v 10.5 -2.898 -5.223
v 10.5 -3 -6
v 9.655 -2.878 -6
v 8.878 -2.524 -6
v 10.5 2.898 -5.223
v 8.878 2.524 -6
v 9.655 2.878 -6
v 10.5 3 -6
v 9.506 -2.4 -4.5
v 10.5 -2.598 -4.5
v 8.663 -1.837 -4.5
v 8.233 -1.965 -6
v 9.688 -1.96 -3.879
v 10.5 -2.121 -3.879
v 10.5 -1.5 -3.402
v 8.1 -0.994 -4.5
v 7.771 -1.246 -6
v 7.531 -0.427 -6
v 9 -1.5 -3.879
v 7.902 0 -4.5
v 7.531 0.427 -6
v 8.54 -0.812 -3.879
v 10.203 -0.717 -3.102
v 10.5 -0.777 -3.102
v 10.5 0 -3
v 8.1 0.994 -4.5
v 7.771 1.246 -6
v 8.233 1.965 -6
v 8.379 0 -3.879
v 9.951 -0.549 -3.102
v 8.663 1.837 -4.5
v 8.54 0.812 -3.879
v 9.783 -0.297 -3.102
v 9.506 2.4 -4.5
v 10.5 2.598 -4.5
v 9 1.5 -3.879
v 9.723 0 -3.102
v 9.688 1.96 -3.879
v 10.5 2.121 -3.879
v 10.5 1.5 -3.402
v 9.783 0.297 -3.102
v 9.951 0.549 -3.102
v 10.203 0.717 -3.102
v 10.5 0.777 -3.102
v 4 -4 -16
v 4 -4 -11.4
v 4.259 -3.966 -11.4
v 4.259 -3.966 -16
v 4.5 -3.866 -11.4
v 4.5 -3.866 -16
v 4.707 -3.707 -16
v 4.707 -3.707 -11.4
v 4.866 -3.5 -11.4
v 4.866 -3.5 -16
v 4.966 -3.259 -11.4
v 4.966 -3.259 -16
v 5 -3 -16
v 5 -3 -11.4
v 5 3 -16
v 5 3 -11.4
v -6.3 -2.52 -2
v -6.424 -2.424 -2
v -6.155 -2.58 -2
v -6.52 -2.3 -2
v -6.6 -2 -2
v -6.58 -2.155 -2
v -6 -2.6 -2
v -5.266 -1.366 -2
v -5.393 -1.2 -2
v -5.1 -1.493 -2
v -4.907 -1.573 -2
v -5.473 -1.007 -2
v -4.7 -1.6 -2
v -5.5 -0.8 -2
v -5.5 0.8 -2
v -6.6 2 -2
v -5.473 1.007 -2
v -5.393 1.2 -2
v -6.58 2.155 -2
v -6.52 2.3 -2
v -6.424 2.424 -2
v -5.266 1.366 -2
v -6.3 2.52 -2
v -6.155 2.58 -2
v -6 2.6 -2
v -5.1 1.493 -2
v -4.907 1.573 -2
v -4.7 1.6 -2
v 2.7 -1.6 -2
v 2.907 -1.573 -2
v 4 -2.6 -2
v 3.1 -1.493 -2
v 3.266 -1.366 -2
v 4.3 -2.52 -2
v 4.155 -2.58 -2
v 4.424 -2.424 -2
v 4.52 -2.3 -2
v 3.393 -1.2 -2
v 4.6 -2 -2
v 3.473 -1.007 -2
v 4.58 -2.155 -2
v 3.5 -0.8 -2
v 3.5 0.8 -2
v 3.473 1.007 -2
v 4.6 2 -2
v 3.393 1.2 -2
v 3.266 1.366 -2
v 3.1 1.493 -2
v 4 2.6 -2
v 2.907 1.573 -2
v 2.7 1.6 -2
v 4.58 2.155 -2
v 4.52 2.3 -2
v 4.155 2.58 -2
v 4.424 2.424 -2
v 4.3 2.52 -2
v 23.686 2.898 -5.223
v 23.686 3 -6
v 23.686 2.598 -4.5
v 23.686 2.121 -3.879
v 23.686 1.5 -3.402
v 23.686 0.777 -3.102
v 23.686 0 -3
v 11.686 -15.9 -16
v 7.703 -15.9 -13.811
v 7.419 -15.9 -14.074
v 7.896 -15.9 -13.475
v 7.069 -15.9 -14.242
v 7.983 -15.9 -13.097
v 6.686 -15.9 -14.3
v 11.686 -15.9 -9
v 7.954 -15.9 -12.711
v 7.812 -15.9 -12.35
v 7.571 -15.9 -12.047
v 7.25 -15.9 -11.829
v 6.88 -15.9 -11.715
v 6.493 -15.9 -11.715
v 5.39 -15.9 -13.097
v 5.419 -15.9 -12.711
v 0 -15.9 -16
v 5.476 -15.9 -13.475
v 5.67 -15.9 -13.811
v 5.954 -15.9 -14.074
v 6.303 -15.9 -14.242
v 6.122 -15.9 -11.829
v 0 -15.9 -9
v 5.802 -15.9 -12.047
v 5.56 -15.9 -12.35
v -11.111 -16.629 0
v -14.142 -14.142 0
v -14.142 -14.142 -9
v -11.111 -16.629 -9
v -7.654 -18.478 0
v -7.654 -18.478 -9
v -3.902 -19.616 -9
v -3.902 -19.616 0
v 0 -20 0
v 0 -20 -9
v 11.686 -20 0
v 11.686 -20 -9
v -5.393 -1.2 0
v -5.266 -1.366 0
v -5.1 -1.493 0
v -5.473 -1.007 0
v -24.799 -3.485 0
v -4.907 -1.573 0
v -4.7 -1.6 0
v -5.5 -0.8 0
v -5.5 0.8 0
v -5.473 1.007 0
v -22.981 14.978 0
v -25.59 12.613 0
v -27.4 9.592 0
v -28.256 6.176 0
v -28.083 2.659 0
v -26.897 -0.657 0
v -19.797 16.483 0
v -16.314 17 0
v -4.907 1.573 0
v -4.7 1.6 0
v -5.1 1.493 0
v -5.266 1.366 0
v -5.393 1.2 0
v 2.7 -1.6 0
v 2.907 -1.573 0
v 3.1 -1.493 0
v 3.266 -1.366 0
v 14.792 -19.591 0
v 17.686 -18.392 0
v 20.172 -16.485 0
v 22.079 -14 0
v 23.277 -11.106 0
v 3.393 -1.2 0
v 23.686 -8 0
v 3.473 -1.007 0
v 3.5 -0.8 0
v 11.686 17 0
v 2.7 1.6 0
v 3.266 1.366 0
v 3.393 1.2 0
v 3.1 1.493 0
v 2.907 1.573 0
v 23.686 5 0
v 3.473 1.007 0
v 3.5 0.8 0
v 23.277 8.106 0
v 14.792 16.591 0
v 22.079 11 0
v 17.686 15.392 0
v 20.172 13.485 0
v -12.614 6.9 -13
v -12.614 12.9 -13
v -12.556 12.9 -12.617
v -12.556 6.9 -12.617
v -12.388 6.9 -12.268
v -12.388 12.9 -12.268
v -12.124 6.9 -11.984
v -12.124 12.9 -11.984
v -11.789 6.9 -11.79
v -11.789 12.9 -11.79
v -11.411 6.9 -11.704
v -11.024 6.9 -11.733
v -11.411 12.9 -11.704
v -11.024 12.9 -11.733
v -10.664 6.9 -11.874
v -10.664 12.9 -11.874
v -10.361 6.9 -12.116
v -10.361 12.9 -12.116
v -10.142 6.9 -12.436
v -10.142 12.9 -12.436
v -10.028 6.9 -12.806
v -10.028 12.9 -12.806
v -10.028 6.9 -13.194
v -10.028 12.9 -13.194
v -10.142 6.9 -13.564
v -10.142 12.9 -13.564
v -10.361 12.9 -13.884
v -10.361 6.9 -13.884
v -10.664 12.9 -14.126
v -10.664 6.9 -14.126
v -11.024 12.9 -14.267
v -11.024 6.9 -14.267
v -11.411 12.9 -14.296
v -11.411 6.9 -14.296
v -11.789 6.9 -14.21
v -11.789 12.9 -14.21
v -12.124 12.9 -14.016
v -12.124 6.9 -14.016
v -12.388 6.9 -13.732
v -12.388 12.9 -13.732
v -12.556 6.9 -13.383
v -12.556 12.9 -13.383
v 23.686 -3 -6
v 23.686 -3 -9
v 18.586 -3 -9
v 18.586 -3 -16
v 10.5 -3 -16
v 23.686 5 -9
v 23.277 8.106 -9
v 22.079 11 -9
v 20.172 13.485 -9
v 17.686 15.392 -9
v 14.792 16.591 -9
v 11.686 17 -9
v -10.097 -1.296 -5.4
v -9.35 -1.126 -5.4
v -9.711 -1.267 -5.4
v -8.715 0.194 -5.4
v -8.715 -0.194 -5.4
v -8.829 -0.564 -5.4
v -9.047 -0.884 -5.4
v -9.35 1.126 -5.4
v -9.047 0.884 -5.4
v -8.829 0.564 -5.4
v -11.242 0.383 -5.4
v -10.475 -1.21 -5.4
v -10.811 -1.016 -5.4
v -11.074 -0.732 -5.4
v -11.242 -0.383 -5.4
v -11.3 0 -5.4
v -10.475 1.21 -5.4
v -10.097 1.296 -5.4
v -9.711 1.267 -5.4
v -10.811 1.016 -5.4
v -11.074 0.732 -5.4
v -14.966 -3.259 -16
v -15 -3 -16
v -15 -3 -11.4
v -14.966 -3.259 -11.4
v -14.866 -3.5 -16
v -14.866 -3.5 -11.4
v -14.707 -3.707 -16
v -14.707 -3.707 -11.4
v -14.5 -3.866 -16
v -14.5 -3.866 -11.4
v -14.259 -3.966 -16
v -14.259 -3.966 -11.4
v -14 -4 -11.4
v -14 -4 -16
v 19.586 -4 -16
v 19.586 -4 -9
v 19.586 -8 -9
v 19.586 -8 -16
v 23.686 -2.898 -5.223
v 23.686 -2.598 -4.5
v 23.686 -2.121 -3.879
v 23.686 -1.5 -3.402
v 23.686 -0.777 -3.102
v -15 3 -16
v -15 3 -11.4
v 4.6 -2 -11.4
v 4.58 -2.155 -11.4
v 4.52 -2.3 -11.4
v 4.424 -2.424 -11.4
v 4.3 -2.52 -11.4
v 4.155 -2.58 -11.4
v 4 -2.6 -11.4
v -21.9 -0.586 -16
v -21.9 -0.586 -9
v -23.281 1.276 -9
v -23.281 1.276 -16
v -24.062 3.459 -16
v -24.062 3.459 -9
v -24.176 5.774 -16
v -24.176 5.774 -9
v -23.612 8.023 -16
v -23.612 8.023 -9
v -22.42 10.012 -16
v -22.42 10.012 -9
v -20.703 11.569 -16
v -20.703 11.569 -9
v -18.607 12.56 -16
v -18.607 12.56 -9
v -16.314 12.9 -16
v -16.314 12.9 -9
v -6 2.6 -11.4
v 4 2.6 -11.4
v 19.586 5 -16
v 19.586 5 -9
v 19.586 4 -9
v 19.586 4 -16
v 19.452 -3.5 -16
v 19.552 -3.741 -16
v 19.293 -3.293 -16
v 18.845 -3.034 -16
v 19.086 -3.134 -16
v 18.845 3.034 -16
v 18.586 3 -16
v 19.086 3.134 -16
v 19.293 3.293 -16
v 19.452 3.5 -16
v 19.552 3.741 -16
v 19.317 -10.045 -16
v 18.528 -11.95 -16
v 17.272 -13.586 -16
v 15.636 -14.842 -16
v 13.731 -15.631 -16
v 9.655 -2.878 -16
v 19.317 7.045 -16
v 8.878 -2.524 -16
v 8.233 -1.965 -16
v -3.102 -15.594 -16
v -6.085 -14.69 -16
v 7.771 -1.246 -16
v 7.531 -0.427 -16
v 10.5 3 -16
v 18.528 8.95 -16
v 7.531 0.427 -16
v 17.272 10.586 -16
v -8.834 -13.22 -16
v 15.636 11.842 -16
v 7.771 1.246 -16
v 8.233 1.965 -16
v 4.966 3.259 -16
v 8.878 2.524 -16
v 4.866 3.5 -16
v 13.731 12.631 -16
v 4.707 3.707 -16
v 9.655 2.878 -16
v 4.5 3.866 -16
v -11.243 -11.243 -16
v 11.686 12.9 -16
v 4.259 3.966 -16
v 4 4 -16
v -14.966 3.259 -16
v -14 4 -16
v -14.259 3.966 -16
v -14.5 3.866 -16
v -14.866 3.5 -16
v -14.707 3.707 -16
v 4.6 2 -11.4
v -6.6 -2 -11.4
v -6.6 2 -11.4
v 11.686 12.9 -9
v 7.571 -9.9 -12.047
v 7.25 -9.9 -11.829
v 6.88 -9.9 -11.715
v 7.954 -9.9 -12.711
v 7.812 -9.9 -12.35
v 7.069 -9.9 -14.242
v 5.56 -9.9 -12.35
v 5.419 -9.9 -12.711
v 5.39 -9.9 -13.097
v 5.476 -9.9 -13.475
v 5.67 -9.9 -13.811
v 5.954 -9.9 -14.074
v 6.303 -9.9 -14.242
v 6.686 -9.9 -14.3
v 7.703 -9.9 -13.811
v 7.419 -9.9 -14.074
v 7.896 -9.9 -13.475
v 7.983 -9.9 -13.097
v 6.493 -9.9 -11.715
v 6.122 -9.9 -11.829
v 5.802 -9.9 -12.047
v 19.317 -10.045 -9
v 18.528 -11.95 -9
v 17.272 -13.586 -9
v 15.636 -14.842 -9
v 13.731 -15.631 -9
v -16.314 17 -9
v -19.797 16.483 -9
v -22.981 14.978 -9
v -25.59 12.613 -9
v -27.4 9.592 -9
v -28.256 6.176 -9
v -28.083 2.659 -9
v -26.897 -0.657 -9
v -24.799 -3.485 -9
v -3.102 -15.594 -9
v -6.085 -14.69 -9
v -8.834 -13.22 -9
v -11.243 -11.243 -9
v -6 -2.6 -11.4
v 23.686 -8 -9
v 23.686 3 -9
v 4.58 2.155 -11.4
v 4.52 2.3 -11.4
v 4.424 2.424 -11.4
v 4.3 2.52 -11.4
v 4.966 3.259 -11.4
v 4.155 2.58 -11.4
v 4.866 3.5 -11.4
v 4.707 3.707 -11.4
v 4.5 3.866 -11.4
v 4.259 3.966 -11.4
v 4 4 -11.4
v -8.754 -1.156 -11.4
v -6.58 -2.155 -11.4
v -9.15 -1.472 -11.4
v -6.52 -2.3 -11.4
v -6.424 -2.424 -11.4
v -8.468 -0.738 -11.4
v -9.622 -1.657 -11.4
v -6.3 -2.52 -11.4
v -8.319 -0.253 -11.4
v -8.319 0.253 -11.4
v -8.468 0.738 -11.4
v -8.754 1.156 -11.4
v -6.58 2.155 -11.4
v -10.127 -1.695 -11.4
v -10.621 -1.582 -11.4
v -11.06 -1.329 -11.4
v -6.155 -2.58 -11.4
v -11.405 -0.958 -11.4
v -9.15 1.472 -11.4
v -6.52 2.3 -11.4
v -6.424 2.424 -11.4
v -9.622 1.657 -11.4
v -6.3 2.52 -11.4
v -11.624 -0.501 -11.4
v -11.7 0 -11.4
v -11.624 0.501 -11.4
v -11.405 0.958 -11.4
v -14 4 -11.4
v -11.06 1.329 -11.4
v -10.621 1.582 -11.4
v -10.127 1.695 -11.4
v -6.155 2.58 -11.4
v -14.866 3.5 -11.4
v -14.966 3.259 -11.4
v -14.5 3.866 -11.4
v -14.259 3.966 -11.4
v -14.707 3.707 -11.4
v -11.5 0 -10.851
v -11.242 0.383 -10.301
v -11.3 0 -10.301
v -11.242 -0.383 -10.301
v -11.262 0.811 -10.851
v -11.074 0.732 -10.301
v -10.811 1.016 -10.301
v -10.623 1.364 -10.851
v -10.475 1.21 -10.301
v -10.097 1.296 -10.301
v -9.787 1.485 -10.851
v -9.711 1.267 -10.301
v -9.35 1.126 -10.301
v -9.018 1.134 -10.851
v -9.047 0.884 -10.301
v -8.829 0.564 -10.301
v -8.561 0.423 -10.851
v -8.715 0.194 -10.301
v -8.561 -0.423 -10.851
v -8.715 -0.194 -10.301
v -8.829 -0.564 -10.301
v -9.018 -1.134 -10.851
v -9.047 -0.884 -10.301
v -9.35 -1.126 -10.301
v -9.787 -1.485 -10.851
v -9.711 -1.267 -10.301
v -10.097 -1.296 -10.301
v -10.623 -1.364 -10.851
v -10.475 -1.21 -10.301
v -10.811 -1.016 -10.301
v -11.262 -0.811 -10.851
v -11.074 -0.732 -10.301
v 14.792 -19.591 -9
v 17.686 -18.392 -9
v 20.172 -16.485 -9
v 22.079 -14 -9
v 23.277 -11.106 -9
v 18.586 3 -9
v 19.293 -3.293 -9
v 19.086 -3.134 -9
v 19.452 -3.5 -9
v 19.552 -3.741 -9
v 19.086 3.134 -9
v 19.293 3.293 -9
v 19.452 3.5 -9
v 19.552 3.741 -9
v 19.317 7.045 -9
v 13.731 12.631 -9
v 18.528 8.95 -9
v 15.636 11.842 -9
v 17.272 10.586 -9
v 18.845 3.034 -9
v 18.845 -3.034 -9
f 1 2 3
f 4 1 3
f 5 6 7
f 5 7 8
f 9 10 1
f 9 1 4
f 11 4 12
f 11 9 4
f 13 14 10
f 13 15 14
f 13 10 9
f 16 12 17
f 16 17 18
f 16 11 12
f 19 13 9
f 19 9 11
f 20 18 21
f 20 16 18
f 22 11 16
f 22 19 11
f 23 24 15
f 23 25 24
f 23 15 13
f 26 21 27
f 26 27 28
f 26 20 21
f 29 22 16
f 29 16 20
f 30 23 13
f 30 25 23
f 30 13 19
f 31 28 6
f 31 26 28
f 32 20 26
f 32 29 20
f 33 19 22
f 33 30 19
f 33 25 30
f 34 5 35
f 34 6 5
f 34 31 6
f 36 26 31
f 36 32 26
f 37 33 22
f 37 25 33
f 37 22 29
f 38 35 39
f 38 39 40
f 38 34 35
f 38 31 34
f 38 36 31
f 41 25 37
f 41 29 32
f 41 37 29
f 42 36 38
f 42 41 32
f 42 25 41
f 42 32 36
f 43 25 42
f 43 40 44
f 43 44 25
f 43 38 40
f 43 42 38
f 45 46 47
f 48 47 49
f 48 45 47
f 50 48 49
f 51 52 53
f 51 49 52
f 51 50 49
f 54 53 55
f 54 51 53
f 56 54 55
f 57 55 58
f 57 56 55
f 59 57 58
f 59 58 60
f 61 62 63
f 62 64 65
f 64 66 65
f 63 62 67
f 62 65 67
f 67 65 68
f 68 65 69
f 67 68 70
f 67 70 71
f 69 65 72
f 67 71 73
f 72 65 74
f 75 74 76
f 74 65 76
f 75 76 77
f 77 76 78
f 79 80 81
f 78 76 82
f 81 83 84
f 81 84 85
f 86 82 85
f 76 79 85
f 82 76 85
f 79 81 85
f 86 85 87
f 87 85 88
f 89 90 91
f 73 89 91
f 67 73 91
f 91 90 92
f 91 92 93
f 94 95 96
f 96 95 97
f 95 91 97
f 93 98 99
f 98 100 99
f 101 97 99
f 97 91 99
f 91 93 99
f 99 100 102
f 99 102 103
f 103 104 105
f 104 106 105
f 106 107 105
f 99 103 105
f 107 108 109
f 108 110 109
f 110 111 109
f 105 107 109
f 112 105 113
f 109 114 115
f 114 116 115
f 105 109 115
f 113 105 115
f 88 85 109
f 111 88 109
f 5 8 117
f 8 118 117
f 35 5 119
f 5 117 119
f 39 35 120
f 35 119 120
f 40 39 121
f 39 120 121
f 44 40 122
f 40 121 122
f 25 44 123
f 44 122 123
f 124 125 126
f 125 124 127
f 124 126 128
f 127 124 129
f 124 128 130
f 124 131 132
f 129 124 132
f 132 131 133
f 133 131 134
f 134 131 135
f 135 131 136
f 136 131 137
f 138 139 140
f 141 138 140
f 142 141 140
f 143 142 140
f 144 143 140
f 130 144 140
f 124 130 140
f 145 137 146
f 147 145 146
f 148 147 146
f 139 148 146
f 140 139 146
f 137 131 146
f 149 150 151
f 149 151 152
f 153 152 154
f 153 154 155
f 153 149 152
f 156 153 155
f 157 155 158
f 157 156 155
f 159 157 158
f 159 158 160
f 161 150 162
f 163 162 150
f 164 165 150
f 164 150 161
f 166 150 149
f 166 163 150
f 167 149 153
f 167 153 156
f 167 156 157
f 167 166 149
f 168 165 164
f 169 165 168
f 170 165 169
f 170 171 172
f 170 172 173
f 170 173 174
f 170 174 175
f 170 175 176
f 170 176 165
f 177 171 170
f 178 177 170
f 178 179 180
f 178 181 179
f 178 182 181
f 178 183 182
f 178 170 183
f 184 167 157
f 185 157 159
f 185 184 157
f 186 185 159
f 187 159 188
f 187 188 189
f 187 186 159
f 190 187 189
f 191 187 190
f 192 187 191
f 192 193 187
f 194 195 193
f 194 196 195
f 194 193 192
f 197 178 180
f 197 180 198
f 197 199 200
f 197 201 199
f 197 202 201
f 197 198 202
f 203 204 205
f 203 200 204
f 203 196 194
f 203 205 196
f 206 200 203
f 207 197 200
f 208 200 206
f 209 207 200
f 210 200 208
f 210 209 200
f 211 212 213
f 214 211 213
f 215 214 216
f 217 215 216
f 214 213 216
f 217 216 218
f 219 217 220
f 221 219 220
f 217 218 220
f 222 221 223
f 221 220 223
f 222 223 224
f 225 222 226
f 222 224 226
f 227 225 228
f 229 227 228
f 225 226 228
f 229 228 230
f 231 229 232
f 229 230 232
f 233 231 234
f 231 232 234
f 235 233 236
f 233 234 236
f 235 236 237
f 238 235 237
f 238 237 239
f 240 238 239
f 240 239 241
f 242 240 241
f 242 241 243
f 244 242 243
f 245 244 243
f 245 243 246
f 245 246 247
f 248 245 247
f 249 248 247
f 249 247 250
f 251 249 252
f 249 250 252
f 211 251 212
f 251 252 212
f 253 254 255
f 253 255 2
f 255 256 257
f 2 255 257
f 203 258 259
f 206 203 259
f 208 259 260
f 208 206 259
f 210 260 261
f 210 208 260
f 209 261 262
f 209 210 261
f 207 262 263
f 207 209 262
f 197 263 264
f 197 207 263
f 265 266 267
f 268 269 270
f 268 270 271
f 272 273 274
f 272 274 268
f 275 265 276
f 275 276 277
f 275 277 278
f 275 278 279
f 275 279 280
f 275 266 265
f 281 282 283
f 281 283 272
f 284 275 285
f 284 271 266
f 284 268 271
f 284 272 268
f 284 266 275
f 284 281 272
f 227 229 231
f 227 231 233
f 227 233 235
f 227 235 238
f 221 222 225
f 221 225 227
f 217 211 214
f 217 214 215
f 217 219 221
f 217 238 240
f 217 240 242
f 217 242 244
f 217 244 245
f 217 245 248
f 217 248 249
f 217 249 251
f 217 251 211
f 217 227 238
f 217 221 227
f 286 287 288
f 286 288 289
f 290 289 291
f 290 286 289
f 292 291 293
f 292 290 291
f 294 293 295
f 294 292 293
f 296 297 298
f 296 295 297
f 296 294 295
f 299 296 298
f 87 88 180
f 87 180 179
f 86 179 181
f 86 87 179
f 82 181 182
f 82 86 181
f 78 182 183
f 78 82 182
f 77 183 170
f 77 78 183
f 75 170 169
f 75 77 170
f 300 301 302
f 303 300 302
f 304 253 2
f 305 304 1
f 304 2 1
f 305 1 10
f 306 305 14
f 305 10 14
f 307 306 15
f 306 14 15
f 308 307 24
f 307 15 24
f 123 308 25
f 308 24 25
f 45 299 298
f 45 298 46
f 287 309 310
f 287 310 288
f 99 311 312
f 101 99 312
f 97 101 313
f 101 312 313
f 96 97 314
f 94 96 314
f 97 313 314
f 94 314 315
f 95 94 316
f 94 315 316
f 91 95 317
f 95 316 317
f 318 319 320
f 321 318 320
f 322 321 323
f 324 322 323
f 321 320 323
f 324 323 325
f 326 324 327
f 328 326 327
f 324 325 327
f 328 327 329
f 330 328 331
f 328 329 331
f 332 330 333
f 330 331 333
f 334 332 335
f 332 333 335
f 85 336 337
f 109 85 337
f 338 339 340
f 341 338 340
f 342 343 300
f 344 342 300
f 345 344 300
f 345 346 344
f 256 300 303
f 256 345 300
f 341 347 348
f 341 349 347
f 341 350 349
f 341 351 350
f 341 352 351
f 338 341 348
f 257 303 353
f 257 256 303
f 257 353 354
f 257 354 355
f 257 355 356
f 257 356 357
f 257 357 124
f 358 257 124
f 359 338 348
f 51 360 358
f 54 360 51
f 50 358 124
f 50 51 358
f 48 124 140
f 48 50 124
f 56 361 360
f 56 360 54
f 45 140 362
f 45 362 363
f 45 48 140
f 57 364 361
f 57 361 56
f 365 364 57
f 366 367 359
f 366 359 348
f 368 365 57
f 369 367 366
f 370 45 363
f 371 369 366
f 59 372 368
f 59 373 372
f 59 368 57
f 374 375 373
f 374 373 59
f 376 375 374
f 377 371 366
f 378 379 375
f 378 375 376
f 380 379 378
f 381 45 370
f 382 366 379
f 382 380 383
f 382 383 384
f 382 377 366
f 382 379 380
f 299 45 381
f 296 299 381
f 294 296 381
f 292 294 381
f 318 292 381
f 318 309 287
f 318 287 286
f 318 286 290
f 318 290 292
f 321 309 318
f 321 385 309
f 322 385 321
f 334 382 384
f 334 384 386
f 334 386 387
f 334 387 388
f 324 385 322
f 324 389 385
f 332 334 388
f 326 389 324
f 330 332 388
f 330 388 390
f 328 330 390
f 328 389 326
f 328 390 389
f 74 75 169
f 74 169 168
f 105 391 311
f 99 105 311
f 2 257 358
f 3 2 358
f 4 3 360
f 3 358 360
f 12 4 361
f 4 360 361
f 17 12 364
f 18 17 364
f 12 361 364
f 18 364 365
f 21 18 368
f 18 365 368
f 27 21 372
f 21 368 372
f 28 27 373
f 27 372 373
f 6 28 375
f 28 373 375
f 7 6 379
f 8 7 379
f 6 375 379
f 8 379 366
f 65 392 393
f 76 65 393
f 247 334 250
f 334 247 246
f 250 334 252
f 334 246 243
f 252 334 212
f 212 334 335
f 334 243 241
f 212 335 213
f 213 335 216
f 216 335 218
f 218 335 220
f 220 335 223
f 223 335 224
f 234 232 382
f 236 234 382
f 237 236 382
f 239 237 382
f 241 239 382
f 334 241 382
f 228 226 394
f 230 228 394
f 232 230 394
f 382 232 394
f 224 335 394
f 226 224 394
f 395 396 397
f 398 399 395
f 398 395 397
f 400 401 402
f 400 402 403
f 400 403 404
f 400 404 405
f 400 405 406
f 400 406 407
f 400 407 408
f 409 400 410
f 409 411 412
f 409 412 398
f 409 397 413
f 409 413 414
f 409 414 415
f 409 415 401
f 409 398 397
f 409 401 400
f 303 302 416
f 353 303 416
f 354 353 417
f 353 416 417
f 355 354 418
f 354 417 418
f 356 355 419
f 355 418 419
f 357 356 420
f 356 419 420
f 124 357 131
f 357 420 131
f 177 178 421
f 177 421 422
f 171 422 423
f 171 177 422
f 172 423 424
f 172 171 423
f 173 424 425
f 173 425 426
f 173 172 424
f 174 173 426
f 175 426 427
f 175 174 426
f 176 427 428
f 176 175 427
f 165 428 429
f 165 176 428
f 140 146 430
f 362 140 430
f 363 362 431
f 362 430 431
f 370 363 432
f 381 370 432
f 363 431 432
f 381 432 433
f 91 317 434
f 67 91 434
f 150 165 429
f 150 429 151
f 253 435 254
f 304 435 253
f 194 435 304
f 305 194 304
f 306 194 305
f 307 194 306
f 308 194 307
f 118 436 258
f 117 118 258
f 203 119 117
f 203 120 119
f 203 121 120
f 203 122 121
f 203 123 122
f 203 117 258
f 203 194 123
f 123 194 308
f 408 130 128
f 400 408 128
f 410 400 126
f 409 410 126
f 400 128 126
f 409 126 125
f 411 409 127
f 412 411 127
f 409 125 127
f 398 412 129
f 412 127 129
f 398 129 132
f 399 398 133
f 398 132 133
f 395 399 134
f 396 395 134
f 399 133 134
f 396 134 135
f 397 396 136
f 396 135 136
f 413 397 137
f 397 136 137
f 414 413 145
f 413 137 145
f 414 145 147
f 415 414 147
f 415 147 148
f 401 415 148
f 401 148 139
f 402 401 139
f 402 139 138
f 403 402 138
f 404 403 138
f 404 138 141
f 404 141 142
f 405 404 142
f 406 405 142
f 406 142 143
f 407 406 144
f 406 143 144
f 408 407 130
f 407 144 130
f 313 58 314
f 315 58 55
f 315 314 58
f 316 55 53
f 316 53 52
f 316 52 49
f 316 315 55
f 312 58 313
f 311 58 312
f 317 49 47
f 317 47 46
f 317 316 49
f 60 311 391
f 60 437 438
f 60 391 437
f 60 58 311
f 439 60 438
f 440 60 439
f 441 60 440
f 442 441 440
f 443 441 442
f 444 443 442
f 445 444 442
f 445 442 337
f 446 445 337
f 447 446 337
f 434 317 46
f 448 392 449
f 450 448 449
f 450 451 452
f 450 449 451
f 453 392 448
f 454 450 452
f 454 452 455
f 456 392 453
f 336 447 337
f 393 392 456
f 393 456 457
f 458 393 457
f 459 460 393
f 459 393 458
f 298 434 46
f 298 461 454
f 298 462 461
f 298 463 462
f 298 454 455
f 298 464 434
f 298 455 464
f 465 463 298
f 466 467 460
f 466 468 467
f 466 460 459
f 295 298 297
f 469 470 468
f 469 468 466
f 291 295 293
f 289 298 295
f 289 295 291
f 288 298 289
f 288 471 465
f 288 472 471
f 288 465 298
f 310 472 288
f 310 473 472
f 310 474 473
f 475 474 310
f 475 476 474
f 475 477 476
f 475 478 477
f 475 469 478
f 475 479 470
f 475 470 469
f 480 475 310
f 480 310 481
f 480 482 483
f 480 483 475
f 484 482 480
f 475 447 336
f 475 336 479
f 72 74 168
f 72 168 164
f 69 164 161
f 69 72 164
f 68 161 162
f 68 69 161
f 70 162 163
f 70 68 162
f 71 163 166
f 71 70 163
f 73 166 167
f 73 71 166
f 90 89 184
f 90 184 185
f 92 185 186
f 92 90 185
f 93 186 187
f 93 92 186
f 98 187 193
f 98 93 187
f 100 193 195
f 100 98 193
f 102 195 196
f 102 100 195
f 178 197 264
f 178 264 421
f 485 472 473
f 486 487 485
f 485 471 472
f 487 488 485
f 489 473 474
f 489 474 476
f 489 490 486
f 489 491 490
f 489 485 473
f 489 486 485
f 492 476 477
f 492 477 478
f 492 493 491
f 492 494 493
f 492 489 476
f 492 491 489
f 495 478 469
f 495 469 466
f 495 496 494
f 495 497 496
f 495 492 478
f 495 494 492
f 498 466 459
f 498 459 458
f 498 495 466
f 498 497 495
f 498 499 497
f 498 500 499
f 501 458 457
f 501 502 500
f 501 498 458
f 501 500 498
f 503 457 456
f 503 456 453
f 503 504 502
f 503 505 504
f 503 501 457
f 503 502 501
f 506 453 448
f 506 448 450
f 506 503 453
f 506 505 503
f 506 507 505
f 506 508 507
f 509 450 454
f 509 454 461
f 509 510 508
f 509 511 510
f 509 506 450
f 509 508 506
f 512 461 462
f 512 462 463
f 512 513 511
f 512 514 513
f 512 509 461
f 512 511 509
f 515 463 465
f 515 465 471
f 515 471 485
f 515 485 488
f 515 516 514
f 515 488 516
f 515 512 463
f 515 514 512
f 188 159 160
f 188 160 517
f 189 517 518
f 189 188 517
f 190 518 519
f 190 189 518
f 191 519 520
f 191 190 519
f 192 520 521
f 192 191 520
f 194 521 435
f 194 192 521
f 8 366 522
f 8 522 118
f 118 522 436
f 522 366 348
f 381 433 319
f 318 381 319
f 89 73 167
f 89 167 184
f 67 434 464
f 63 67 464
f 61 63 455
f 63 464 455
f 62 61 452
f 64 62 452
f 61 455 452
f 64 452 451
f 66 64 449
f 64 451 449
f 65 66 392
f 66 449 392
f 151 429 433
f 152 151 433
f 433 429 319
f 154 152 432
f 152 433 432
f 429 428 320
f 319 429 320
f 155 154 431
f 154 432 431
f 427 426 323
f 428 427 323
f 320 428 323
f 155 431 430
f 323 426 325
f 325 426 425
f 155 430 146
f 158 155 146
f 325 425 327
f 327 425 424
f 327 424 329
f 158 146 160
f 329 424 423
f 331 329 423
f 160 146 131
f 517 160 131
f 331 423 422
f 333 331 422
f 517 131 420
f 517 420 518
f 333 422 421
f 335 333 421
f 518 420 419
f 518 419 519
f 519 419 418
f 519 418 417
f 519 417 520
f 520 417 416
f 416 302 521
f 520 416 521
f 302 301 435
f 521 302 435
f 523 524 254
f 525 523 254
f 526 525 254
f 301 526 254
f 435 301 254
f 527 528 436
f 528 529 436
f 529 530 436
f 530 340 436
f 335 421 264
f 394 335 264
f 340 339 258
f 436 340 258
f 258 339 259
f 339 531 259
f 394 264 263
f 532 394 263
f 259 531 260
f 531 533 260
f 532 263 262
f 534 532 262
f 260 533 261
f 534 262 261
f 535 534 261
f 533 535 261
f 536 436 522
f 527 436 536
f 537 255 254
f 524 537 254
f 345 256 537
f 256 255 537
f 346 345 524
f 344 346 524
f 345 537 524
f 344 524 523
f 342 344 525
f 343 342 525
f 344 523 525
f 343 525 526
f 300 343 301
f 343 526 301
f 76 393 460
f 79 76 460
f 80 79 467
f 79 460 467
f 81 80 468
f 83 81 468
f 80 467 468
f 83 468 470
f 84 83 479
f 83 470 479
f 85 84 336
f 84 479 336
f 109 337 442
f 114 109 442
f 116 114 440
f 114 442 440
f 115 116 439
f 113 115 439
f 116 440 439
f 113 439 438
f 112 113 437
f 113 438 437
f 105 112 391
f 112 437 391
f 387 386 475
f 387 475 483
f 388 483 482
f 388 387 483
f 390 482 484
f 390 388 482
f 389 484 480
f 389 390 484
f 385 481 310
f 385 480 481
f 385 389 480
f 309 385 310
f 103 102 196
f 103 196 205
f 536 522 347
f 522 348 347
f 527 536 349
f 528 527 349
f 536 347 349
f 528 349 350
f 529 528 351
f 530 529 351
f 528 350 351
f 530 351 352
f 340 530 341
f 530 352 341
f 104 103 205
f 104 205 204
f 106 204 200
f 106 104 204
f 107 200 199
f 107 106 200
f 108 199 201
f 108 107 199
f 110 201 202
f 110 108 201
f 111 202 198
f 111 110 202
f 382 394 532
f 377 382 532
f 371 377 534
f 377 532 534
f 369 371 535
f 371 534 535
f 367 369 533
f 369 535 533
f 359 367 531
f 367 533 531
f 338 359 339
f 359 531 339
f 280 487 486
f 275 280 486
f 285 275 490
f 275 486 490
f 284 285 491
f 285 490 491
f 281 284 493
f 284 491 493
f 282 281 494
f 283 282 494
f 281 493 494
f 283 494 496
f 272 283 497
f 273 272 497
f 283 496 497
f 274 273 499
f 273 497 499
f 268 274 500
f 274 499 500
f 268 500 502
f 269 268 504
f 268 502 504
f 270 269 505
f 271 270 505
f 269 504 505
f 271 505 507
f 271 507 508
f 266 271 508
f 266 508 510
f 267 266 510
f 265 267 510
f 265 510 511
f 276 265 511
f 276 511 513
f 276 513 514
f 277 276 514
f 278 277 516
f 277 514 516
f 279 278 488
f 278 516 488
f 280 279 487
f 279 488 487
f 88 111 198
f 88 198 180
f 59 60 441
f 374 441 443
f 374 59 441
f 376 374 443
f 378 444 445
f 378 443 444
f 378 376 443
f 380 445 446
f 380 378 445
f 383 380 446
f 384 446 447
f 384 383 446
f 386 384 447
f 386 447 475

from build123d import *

# Parameters (mm, degrees)
EXTRUDE_1_DEPTH     = 9
EXTRUDE_2_DEPTH     = 7
SKETCH_6_R          = 1.3
CUT_EXTRUDE_1_DEPTH = 6
SKETCH_7_R          = 1.3
CUT_EXTRUDE_2_DEPTH = 6
CUT_EXTRUDE_3_DEPTH = 14
CUT_EXTRUDE_4_DEPTH = 2
EXTRUDE_START       = 9.4
EXTRUDE_4_DEPTH     = 9.4
SKETCH_11_R         = 1.3
CUT_EXTRUDE_5_DEPTH = 6
CHAMFER_1_SIZE      = 0.4
CHAMFER_1_SIZE2     = 1.098990968
CUT_EXTRUDE_6_DEPTH = 13
FILLET_1_R          = 3
FILLET_2_R          = 1


with BuildPart() as part:
    # 草图2 → 凸台-拉伸1 (new body)
    with BuildSketch(Plane.XY):
        with BuildLine():
            Line((-24.798989873, -3.485281374), (-14.142135624, -14.142135624))
            ThreePointArc((-14.142135624, -14.142135624), (-7.653668647, -18.47759065), (0, -20))
            Line((0, -20), (11.686291501, -20))
            ThreePointArc((11.686291501, -20), (20.171572875, -16.485281374), (23.686291501, -8))
            Line((23.686291501, -8), (23.686291501, 5))
            ThreePointArc((23.686291501, 5), (20.171572875, 13.485281374), (11.686291501, 17))
            Line((11.686291501, 17), (-16.313708499, 17))
            ThreePointArc((-16.313708499, 17), (-27.400262889, 9.592201188), (-24.798989873, -3.485281374))
        make_face()
    extrude(amount=-EXTRUDE_1_DEPTH)

    # 草图3 → 凸台-拉伸2 (add)
    with BuildSketch(Plane(origin=(0, 0, -9), x_dir=(-1, 0, 0), z_dir=(0, 0, -1))):
        with BuildLine():
            Line((16.313708499, 12.9), (-11.686291501, 12.9))
            ThreePointArc((-11.686291501, 12.9), (-17.272435072, 10.586143571), (-19.586291501, 5))
            Line((-19.586291501, 5), (-19.586291501, -8))
            ThreePointArc((-19.586291501, -8), (-17.272435072, -13.586143571), (-11.686291501, -15.9))
            Line((-11.686291501, -15.9), (0, -15.9))
            ThreePointArc((0, -15.9), (6.084666575, -14.689684567), (11.242997821, -11.242997821))
            Line((11.242997821, -11.242997821), (21.89985207, -0.586143571))
            ThreePointArc((21.89985207, -0.586143571), (23.612356806, 8.023199116), (16.313708499, 12.9))
        make_face()
    extrude(amount=EXTRUDE_2_DEPTH)

    # 草图6 → 切除-拉伸1 (cut)
    with BuildSketch(Plane(origin=(0, 12.9, 0), x_dir=(1, 0, 0), z_dir=(0, 1, 0))):
        with Locations(Location((-11.313708499, 13, 0), (0, 0, 180))):
            Circle(SKETCH_6_R)
    extrude(amount=-CUT_EXTRUDE_1_DEPTH, mode=Mode.SUBTRACT)

    # 草图7 → 切除-拉伸2 (cut)
    with BuildSketch(Plane.XZ.offset(15.9)):
        with Locations(Location((6.686291501, -13, 0), (0, 0, 270))):
            Circle(SKETCH_7_R)
    extrude(amount=-CUT_EXTRUDE_2_DEPTH, mode=Mode.SUBTRACT)

    # 草图8 → 切除-拉伸3 (cut)
    with BuildSketch(Plane(origin=(0, 0, -16), x_dir=(-1, 0, 0), z_dir=(0, 0, -1))):
        with BuildLine():
            Line((-4, 4), (14, 4))
            ThreePointArc((14, 4), (14.707106781, 3.707106781), (15, 3))
            Line((15, 3), (15, -3))
            ThreePointArc((15, -3), (14.707106781, -3.707106781), (14, -4))
            Line((14, -4), (-4, -4))
            ThreePointArc((-4, -4), (-4.707106781, -3.707106781), (-5, -3))
            Line((-5, -3), (-5, 3))
            ThreePointArc((-5, 3), (-4.707106781, 3.707106781), (-4, 4))
        make_face()
    extrude(amount=-CUT_EXTRUDE_3_DEPTH, mode=Mode.SUBTRACT)

    # 草图9 → 切除-拉伸4 (cut)
    with BuildSketch(Plane(origin=(0, 0, -2), x_dir=(-1, 0, 0), z_dir=(0, 0, -1))):
        with BuildLine():
            Line((-2.7, 1.6), (4.7, 1.6))
            ThreePointArc((4.7, 1.6), (5.265685425, 1.365685425), (5.5, 0.8))
            Line((5.5, 0.8), (5.5, -0.8))
            ThreePointArc((5.5, -0.8), (5.265685425, -1.365685425), (4.7, -1.6))
            Line((4.7, -1.6), (-2.7, -1.6))
            ThreePointArc((-2.7, -1.6), (-3.265685425, -1.365685425), (-3.5, -0.8))
            Line((-3.5, -0.8), (-3.5, 0.8))
            ThreePointArc((-3.5, 0.8), (-3.265685425, 1.365685425), (-2.7, 1.6))
        make_face()
    extrude(amount=-CUT_EXTRUDE_4_DEPTH, mode=Mode.SUBTRACT)

    # 草图10 → 凸台-拉伸4 (add)
    with BuildSketch(Plane(origin=(0, 0, -2), x_dir=(-1, 0, 0), z_dir=(0, 0, -1)).offset(EXTRUDE_START)):
        with BuildLine():
            Line((14, 4), (-4, 4))
            ThreePointArc((-4, 4), (-4.707106781, 3.707106781), (-5, 3))
            Line((-5, 3), (-5, -3))
            ThreePointArc((-5, -3), (-4.707106781, -3.707106781), (-4, -4))
            Line((-4, -4), (14, -4))
            ThreePointArc((14, -4), (14.707106781, -3.707106781), (15, -3))
            Line((15, -3), (15, 3))
            ThreePointArc((15, 3), (14.707106781, 3.707106781), (14, 4))
        make_face()
        with BuildLine():
            Line((-4, -2.6), (6, -2.6))
            ThreePointArc((6, -2.6), (6.424264069, -2.424264069), (6.6, -2))
            Line((6.6, -2), (6.6, 2))
            ThreePointArc((6.6, 2), (6.424264069, 2.424264069), (6, 2.6))
            Line((6, 2.6), (-4, 2.6))
            ThreePointArc((-4, 2.6), (-4.424264069, 2.424264069), (-4.6, 2))
            Line((-4.6, 2), (-4.6, -2))
            ThreePointArc((-4.6, -2), (-4.424264069, -2.424264069), (-4, -2.6))
        make_face(mode=Mode.SUBTRACT)
    extrude(amount=-EXTRUDE_4_DEPTH)

    # 草图11 → 切除-拉伸5 (cut)
    with BuildSketch(Plane(origin=(0, 0, -11.4), x_dir=(-1, 0, 0), z_dir=(0, 0, -1))):
        with Locations((10, 0)):
            Circle(SKETCH_11_R)
    extrude(amount=-CUT_EXTRUDE_5_DEPTH, mode=Mode.SUBTRACT)

    # 倒角1
    chamfer_1_edges = [part.edges().sort_by_distance(p)[0] for p in [
        (-8.7, 0, -11.4),
    ]]
    chamfer_1_side = [part.faces().sort_by_distance(p)[0] for p in [
        (-7.139463972, 0, -11.4),
    ]]
    chamfer(chamfer_1_edges, length=CHAMFER_1_SIZE, length2=CHAMFER_1_SIZE2, reference=chamfer_1_side[0])

    # 草图14 → 切除-拉伸6 (cut)
    with BuildSketch(Plane(origin=(0, 0, -16), x_dir=(-1, 0, 0), z_dir=(0, 0, -1))):
        with BuildLine():
            Line((-10.5, 3), (-23.686291501, 3))
            Line((-23.686291501, 3), (-23.686291501, -3))
            Line((-23.686291501, -3), (-10.5, -3))
            ThreePointArc((-10.5, -3), (-7.5, 0), (-10.5, 3))
        make_face()
    extrude(amount=-CUT_EXTRUDE_6_DEPTH, mode=Mode.SUBTRACT)

    # 圆角1
    fillet_1_edges = [part.edges().sort_by_distance(p)[0] for p in [
        (17.093145751, -3, -3),
        (17.093145751, 3, -3),
        (7.5, 0, -3),
    ]]
    fillet(fillet_1_edges, radius=FILLET_1_R - 0.0001)  # a hair under: the kernel refuses the full size

    # 圆角2
    fillet_2_edges = [part.edges().sort_by_distance(p)[0] for p in [
        (19.586291501, 3, -12.5),
        (19.586291501, -3, -12.5),
    ]]
    fillet(fillet_2_edges, radius=FILLET_2_R)


solid = part.part
